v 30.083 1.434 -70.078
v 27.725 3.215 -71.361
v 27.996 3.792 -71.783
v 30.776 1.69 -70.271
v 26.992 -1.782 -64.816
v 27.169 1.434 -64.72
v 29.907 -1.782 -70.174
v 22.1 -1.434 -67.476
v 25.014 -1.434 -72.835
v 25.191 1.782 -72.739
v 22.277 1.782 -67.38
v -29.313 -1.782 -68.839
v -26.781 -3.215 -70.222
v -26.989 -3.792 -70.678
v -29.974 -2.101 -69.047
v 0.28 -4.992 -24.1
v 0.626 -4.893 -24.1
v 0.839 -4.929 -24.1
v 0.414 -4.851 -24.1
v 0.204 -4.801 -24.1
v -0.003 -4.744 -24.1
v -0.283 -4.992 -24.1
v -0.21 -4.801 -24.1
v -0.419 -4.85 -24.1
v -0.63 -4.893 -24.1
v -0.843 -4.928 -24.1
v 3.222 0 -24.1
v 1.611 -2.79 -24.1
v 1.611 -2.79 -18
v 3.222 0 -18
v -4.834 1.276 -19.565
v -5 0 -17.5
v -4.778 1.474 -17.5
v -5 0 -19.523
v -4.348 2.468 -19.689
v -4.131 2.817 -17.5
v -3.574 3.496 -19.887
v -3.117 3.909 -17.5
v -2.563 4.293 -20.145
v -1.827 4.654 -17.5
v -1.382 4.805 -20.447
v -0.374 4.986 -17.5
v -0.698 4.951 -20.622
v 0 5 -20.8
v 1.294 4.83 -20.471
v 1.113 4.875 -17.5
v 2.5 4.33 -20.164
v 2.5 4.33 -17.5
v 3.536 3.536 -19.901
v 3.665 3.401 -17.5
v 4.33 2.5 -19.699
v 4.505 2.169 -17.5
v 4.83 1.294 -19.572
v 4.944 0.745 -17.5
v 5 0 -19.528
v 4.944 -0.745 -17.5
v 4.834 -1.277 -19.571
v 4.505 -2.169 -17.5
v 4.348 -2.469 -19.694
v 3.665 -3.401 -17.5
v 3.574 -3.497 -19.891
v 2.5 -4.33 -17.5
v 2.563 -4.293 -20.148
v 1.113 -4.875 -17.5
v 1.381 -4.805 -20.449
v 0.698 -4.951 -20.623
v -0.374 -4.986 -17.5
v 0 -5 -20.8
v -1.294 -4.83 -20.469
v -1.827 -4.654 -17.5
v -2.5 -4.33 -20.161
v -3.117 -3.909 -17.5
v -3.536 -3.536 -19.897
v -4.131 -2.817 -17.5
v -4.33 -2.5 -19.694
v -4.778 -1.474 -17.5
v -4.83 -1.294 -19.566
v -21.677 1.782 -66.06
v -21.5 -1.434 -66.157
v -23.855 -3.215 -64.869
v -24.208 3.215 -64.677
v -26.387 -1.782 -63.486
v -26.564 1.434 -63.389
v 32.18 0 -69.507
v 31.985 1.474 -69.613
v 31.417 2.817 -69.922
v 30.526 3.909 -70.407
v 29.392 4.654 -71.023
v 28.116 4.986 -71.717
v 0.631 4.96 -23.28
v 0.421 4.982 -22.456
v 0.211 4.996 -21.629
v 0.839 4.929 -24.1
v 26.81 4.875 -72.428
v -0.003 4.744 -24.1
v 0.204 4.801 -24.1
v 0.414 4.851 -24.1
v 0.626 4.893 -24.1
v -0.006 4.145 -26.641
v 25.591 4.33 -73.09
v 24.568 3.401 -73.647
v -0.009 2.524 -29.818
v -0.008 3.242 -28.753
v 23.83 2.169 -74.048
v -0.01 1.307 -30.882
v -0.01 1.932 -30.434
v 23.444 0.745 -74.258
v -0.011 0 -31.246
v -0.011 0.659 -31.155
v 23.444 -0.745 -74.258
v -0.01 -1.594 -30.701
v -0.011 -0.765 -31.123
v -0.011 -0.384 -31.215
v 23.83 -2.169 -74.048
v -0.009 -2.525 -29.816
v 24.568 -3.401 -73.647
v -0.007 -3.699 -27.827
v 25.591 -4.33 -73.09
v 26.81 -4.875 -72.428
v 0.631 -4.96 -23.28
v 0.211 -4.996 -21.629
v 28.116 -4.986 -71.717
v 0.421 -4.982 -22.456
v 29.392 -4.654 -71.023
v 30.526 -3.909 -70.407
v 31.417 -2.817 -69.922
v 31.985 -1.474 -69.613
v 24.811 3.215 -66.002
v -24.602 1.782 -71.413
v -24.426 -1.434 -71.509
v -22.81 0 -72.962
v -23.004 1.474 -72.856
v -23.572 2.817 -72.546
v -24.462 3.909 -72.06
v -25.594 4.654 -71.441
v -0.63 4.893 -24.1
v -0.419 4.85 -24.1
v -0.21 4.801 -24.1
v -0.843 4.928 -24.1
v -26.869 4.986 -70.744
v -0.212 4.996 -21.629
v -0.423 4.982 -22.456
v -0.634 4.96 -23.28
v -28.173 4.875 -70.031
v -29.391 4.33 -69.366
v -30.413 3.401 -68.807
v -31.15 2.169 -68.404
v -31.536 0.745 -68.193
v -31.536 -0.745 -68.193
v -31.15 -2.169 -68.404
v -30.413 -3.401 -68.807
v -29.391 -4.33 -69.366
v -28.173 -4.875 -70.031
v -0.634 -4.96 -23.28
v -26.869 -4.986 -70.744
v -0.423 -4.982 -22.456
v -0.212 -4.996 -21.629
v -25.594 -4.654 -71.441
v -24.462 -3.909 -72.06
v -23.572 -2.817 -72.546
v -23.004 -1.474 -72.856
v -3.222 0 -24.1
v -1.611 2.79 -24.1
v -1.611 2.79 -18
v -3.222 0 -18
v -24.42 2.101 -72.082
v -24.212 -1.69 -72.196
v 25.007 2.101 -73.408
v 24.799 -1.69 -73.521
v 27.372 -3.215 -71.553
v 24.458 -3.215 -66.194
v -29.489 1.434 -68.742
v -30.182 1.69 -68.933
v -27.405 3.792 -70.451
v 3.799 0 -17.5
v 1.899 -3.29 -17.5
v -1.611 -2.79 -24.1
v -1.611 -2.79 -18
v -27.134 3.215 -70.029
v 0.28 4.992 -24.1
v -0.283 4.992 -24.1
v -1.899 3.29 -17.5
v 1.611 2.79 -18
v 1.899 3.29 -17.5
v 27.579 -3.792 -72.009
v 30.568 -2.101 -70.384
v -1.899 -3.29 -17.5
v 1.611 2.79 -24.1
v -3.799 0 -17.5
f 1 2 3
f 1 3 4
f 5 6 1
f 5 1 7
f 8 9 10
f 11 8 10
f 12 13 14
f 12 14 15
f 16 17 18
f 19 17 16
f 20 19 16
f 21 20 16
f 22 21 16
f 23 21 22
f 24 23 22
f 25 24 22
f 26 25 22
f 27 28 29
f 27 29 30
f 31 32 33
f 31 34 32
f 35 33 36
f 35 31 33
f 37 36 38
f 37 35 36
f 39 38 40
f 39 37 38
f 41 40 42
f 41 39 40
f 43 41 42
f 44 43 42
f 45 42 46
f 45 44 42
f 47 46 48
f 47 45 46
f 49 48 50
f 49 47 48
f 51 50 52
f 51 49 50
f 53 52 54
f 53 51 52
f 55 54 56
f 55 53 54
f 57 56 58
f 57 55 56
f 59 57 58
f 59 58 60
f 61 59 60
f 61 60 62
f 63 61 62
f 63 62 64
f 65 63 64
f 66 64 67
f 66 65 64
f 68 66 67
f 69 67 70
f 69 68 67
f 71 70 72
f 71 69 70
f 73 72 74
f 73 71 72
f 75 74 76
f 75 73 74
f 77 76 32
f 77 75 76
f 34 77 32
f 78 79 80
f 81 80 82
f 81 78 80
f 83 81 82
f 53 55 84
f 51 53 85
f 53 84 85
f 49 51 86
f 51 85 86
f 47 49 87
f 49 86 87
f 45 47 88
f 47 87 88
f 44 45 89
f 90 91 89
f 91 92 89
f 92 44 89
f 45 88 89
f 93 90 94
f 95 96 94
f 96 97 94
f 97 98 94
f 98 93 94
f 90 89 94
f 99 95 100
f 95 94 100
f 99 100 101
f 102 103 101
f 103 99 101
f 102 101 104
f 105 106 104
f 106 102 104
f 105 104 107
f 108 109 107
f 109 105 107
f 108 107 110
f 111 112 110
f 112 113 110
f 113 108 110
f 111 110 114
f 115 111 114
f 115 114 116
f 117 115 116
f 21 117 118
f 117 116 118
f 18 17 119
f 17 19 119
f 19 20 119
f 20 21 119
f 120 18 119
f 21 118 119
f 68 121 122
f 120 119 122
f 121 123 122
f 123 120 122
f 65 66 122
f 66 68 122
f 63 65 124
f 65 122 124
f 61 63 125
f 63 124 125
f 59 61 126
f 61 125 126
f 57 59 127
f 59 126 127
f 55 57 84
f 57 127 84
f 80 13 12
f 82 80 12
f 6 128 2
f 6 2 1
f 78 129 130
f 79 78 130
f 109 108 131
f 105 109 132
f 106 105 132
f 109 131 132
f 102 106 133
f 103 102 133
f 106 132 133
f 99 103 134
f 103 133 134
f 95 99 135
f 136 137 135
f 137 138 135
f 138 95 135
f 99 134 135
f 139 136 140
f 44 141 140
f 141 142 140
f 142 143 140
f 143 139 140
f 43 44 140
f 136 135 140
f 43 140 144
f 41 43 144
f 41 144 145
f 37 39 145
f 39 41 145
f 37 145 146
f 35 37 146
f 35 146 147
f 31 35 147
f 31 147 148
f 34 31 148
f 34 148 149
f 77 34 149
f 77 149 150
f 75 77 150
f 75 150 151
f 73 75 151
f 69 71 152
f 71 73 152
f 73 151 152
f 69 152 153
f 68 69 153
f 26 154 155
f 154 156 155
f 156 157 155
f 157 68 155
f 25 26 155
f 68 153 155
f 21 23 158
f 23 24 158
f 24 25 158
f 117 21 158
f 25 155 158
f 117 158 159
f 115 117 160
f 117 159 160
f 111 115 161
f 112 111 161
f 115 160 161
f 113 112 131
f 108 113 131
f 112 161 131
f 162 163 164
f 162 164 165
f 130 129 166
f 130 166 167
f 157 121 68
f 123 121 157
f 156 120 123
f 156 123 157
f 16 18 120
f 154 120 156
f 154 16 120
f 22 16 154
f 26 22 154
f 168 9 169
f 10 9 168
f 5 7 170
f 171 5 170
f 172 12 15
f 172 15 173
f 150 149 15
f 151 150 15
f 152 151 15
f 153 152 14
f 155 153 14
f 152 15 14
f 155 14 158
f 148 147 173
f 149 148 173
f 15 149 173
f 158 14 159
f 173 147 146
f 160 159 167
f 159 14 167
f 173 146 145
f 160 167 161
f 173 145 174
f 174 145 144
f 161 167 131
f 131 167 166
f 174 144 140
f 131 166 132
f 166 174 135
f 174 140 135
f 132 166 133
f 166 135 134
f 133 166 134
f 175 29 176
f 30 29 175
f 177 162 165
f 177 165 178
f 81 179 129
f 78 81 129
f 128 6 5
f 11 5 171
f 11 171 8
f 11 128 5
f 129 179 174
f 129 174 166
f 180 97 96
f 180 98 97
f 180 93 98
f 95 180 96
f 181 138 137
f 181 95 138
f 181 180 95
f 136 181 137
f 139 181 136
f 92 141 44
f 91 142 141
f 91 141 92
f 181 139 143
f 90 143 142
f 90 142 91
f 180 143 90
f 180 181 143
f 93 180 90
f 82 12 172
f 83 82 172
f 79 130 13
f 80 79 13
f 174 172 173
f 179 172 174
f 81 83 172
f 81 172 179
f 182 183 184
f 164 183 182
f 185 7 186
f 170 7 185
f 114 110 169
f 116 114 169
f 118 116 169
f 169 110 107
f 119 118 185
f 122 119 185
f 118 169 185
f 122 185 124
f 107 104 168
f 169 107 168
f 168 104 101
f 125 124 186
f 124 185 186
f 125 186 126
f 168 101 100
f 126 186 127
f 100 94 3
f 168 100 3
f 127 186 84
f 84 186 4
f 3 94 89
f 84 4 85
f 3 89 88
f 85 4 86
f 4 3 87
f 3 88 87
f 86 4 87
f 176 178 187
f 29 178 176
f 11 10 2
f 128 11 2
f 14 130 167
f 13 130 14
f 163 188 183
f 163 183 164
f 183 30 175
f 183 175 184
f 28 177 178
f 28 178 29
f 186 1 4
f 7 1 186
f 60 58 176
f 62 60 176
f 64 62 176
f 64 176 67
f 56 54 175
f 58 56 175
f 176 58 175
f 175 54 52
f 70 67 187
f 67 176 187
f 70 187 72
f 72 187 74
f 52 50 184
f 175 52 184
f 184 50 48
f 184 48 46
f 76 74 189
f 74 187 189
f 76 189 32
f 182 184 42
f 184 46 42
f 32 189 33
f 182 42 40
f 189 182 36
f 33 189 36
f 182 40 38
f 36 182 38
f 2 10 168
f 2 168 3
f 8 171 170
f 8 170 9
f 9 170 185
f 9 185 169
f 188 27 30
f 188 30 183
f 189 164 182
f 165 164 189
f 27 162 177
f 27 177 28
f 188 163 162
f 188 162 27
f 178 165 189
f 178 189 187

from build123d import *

# Parameters (mm, degrees)
SKETCH1_W           = 5
SKETCH1_H           = 6.6
BOSS_EXTRUDE1_REACH = 64.005
SKETCH21_R          = 5
BOSS_EXTRUDE2_REACH = 78.152
SKETCH22_R          = 5
CUT_EXTRUDE3_DEPTH  = 6.6
CUT_EXTRUDE4_DEPTH  = 6.6
CUT_EXTRUDE5_DEPTH  = 6.6
CHAMFER2_SIZE       = 0.5


with BuildPart() as part:
    # Sketch1 → Revolve-Thin1 (revolve)
    with BuildSketch(Plane(origin=(0, 0, 0), x_dir=(1, 0, 0), z_dir=(0, 1, 0))):
        with Locations((-2.5, 20.8)):
            Rectangle(SKETCH1_W, SKETCH1_H)
    revolve(axis=Axis((0, 0, -17.5), (0, 0, -1)))

    # Sketch21 → Boss-Extrude1 (add, up to next)
    with BuildSketch(Plane(origin=(-35.950232756, 0, -65.780747057), x_dir=(0.877503712, 0, -0.479569845), z_dir=(0.479569845, 0, 0.877503712)), mode=Mode.PRIVATE) as boss_extrude1_sk1:
        with Locations((9.975052777, 0)):
            Circle(SKETCH21_R)
    boss_extrude1_tool1 = extrude(boss_extrude1_sk1.sketch, amount=BOSS_EXTRUDE1_REACH, mode=Mode.PRIVATE) - part.part
    add(boss_extrude1_tool1.solids().sort_by_distance((-27.197087, 0, -70.564482))[0])

    # Sketch22 → Boss-Extrude2 (add, up to next)
    with BuildSketch(Plane(origin=(36.517428466, 0, -67.14845845), x_dir=(0.878494382, 0, 0.477752677), z_dir=(-0.477752677, 0, 0.878494382)), mode=Mode.PRIVATE) as boss_extrude2_sk1:
        with Locations((-9.937255677, 0)):
            Circle(SKETCH22_R)
    boss_extrude2_tool1 = extrude(boss_extrude2_sk1.sketch, amount=BOSS_EXTRUDE2_REACH, mode=Mode.PRIVATE) - part.part
    add(boss_extrude2_tool1.solids().sort_by_distance((27.787605, 0, -71.896009))[0])

    # Sketch29 → Cut-Extrude3 (cut)
    with BuildSketch(Plane(origin=(-35.950232756, 0, -65.780747057), x_dir=(-0.877503712, 0, 0.479569845), z_dir=(-0.479569845, 0, -0.877503712))):
        Polygon((-7.089955208, 1.433531311), (-9.773978525, 3.215333442), (-12.659076094, 1.781802131), (-12.860150346, -1.433531311), (-10.176127029, -3.215333442), (-7.29102946, -1.781802131), align=None)
    extrude(amount=-CUT_EXTRUDE3_DEPTH, mode=Mode.SUBTRACT)

    # Sketch30 → Cut-Extrude4 (cut)
    with BuildSketch(Plane(origin=(36.517428466, 0, -67.14845845), x_dir=(-0.878494382, 0, -0.477752677), z_dir=(0.477752677, 0, -0.878494382))):
        Polygon((12.621278993, 1.781802131), (9.736181425, 3.215333442), (7.052158108, 1.433531311), (7.25323236, -1.781802131), (10.138329929, -3.215333442), (12.822353245, -1.433531311), align=None)
    extrude(amount=-CUT_EXTRUDE4_DEPTH, mode=Mode.SUBTRACT)

    # Sketch18 → Cut-Extrude5 (cut)
    with BuildSketch(Plane.XY.offset(-17.5)):
        Polygon((1.610807251, 2.79), (-1.610807251, 2.79), (-3.221614502, 0), (-1.610807251, -2.79), (1.610807251, -2.79), (3.221614502, 0), align=None)
    extrude(amount=-CUT_EXTRUDE5_DEPTH, mode=Mode.SUBTRACT)

    # Chamfer2
    chamfer2_edges = [part.edges().sort_by_distance(p)[0] for p in [
        (-29.640549045, -0.17413541, -69.229090352),
        (-28.551150535, 2.324432377, -69.824464101),
        (-26.107688412, 2.498567787, -71.159855321),
        (-24.753624798, 0.17413541, -71.899872792),
        (-25.843023308, -2.324432377, -71.304499043),
        (-28.286485432, -2.498567787, -69.969107823),
        (25.341384472, 0.17413541, -73.226340155),
        (26.696976775, 2.498567787, -72.489126731),
        (29.143197481, 2.324432377, -71.158795526),
        (30.233825884, -0.17413541, -70.565677745),
        (28.87823358, -2.498567787, -71.302891169),
        (26.432012874, -2.324432377, -72.633222374),
        (2.416210877, 1.395, -17.5),
        (0, 2.79, -17.5),
        (-2.416210877, 1.395, -17.5),
        (-2.416210877, -1.395, -17.5),
        (0, -2.79, -17.5),
        (2.416210877, -1.395, -17.5),
    ]]
    chamfer(chamfer2_edges, length=CHAMFER2_SIZE)


solid = part.part
